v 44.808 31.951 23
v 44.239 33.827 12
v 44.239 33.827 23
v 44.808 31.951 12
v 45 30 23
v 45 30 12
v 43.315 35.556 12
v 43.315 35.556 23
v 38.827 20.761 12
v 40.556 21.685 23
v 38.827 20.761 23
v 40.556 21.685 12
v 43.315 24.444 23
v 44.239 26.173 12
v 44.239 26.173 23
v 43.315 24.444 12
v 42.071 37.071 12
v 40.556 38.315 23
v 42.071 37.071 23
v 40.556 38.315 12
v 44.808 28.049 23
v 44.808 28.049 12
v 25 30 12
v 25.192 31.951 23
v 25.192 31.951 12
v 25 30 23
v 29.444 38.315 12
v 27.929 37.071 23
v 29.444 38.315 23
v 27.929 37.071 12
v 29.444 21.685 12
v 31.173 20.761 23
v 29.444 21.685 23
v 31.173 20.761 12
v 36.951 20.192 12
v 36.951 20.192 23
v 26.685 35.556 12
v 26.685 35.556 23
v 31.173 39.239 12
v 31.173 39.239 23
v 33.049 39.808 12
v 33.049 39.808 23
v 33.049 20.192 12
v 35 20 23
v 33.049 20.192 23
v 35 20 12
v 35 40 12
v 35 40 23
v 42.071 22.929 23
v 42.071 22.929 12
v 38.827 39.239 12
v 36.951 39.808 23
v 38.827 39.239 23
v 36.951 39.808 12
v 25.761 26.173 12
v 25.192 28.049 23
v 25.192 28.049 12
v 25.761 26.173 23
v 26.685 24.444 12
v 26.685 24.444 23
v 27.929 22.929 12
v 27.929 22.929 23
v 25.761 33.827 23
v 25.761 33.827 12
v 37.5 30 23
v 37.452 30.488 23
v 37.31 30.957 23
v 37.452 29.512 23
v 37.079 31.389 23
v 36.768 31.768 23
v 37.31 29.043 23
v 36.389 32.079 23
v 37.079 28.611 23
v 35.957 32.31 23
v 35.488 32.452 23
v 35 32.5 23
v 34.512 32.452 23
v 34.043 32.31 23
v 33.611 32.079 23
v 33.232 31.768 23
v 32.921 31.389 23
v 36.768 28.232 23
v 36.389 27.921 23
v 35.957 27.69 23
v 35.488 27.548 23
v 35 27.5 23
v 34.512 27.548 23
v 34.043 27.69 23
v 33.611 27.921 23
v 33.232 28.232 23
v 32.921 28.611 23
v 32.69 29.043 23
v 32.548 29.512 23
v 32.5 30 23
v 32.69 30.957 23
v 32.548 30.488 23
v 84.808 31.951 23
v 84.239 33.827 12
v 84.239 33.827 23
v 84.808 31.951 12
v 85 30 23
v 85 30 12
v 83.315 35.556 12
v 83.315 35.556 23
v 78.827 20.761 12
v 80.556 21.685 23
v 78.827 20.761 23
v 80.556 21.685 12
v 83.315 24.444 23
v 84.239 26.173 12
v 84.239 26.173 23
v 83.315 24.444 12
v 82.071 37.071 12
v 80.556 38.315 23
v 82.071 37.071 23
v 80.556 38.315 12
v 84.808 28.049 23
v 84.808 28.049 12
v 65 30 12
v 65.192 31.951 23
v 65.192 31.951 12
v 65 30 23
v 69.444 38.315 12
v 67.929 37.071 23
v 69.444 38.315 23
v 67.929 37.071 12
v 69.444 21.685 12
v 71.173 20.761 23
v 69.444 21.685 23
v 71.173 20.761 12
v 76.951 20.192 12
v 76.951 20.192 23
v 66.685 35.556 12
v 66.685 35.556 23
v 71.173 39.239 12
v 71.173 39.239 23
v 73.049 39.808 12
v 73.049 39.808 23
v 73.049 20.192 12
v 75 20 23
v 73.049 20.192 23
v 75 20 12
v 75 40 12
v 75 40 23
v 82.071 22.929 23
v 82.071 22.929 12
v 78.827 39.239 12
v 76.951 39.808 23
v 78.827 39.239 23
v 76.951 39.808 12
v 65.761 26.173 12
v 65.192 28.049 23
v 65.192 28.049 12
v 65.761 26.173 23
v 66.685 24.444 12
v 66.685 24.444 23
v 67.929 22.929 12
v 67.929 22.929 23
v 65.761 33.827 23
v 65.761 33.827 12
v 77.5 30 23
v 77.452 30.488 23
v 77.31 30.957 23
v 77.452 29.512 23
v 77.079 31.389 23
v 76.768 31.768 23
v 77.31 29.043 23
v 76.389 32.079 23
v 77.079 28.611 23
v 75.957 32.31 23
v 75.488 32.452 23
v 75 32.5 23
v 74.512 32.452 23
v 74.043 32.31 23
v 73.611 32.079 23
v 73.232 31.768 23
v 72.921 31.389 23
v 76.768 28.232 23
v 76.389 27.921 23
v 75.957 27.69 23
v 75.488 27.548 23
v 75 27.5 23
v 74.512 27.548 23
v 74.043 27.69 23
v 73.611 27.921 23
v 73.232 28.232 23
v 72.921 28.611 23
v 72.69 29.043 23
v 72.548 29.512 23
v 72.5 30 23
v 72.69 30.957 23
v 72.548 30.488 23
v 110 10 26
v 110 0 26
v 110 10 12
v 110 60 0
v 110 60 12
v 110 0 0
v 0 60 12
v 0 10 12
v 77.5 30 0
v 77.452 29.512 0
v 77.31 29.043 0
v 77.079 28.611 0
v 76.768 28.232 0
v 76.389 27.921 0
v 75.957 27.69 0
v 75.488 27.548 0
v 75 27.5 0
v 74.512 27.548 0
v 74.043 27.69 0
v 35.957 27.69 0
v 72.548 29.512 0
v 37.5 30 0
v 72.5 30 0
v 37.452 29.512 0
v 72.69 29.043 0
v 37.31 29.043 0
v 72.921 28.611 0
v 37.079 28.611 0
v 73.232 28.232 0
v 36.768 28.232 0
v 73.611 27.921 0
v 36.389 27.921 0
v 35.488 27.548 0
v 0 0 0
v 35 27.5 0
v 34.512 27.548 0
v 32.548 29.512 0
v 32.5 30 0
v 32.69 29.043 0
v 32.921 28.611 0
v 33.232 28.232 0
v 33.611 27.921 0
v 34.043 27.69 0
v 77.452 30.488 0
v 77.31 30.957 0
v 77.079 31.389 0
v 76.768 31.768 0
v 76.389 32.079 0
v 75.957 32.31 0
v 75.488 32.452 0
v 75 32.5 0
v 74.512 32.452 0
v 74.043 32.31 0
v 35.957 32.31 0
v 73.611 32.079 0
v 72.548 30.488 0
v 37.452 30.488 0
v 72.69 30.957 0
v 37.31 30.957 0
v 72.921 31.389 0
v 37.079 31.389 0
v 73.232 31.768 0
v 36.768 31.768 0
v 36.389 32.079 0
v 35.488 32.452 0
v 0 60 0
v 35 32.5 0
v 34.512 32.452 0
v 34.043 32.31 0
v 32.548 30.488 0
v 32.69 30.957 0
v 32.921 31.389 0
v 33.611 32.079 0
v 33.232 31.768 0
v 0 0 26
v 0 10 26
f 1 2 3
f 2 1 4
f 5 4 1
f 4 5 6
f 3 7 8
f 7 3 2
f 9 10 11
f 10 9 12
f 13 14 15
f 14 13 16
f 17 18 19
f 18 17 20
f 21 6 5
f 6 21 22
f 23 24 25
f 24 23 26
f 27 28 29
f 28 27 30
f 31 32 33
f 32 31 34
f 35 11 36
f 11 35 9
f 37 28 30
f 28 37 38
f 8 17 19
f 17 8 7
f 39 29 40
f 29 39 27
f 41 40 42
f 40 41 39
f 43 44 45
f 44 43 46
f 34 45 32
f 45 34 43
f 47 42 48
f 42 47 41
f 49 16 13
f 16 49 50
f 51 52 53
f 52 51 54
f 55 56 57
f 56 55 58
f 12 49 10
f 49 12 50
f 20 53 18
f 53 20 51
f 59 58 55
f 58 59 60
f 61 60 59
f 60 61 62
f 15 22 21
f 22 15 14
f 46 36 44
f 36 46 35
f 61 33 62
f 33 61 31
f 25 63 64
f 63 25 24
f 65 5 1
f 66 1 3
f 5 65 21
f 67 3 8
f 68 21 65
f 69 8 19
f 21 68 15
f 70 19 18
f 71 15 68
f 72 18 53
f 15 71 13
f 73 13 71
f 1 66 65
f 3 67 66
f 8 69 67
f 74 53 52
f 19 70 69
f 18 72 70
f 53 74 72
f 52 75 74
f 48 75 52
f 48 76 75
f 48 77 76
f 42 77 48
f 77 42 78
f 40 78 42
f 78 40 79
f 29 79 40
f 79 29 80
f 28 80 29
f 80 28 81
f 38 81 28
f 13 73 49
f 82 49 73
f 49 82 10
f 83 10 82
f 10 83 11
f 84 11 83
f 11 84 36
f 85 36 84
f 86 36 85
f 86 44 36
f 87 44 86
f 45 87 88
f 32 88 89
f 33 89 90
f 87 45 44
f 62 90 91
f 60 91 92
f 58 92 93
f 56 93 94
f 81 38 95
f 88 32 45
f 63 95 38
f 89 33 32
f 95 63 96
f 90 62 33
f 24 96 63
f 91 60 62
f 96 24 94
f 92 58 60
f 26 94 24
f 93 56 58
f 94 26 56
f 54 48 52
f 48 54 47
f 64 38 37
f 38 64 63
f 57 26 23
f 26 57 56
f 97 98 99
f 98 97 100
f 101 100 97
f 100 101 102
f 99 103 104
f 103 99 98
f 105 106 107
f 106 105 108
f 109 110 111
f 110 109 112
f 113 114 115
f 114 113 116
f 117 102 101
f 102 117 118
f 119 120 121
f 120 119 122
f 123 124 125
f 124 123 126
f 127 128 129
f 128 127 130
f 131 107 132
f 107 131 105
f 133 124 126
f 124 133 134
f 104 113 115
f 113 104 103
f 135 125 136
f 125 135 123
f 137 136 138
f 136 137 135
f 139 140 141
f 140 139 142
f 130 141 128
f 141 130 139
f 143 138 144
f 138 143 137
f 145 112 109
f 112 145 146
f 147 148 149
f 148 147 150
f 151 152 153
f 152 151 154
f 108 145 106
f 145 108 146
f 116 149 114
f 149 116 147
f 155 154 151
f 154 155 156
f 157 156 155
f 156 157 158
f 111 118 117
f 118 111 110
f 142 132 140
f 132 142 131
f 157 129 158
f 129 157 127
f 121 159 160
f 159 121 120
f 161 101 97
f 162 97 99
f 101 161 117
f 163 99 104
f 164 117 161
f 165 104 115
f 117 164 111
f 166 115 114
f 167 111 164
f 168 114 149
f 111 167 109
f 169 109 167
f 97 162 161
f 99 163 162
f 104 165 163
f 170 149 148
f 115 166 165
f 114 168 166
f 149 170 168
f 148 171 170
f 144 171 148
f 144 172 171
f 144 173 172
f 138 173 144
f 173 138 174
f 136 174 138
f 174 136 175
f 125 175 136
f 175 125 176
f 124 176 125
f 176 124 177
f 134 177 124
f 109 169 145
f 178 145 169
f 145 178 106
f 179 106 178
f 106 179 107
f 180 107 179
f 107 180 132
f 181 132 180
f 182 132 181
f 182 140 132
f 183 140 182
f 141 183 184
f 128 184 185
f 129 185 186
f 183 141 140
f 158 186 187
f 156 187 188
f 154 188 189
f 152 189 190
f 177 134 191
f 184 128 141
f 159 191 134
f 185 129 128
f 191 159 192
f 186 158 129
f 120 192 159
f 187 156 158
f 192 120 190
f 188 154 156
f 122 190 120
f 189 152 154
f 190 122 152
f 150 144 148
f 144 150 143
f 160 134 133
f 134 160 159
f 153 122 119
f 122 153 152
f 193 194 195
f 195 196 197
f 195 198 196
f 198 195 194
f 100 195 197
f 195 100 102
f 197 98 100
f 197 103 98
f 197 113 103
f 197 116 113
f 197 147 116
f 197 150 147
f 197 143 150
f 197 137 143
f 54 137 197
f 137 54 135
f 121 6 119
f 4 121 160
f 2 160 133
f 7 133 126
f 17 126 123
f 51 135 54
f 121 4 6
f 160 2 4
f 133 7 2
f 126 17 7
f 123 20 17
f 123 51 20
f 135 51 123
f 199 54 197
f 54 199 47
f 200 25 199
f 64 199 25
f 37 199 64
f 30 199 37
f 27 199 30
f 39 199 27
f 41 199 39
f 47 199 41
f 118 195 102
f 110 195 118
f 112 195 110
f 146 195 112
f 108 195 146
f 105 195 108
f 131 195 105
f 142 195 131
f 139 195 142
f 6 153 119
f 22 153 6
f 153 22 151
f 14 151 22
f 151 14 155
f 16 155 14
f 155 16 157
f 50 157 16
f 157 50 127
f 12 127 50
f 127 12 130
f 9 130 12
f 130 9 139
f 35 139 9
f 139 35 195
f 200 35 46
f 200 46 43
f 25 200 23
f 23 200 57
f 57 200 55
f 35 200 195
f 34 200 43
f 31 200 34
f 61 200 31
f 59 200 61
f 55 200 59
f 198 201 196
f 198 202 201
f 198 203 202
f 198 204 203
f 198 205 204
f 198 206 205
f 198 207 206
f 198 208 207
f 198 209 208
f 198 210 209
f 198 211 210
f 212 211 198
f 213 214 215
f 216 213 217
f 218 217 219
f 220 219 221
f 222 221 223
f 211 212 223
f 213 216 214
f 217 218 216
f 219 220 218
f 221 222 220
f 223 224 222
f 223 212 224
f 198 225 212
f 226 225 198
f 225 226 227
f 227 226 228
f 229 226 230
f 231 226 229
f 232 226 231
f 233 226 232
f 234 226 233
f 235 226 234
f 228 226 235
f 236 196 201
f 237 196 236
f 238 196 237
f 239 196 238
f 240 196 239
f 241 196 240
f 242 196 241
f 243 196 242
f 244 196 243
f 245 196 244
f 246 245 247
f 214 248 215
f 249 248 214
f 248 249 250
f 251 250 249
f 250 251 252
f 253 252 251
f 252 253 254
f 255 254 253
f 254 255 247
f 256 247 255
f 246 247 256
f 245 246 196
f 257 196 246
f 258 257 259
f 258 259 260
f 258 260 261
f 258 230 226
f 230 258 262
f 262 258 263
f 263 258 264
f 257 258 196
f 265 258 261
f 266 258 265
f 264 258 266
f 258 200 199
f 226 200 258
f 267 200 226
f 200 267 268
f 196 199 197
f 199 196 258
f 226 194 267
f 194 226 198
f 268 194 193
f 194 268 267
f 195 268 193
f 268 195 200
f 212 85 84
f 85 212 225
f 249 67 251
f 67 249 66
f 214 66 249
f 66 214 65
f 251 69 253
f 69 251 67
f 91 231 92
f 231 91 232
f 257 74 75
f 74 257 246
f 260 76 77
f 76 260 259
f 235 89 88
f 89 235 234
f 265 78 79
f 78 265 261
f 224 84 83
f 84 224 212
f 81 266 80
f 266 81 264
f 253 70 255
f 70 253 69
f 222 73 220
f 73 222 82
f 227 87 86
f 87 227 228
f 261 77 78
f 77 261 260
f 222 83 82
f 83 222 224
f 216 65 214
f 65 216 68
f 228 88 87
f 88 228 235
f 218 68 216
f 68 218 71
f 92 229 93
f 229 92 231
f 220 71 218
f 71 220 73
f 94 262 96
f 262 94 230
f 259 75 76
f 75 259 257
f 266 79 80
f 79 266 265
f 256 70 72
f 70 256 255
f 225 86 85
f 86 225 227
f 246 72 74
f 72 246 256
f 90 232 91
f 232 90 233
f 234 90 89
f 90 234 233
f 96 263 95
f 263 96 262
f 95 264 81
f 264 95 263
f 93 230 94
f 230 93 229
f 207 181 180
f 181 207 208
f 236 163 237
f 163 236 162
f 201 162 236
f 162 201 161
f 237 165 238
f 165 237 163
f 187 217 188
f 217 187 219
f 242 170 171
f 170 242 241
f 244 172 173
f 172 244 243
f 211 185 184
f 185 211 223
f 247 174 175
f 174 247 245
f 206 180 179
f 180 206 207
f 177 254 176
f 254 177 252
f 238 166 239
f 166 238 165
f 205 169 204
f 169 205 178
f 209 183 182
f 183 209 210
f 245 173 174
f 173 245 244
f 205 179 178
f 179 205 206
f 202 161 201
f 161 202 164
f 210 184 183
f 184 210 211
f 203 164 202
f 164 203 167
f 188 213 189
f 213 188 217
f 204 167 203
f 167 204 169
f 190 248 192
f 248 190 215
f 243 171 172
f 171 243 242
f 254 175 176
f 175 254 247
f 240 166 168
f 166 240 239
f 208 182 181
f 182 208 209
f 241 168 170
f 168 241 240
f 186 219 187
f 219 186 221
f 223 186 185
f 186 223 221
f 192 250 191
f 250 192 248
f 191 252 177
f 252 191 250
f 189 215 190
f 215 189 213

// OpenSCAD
$fn = 32;

// ----------------------------------------------------------------------
// Drill jig: fence jig
// ----------------------------------------------------------------------

// --- parameters (mm) ---
plate_l = 110;            // plate length, X
plate_w = 60;             // plate width, Y
plate_t = 12;             // plate thickness
boss_d = 20;              // guide boss diameter
boss_h = 12;              // boss height above the plate
guide_d = 5;              // guide hole diameter
boss_pitch = 40;          // boss pitch
fence_h = 15;             // fence height above the plate
fence_t = 10;             // fence thickness

n_boss = 2;  // guide bosses
boss_x0 = (plate_l - (n_boss - 1) * boss_pitch) / 2;  // first boss X
boss_top = plate_t - 1 + boss_h;  // boss crown height
fence_top = plate_t - 1 + fence_h;  // fence crown height
total_h = max([fence_top, boss_top]);  // overall height

difference() {
  union() {
  cube([plate_l, plate_w, plate_t]);
  for (i = [0 : n_boss - 1])
    translate([boss_x0 + i * boss_pitch, plate_w / 2, plate_t - 1])
      cylinder(h = boss_h, d = boss_d);
  translate([0, 0, plate_t - 1]) cube([plate_l, fence_t, fence_h]);
  }
  for (i = [0 : n_boss - 1])
    translate([boss_x0 + i * boss_pitch, plate_w / 2, -1])
      cylinder(h = plate_t + boss_h, d = guide_d);
}
